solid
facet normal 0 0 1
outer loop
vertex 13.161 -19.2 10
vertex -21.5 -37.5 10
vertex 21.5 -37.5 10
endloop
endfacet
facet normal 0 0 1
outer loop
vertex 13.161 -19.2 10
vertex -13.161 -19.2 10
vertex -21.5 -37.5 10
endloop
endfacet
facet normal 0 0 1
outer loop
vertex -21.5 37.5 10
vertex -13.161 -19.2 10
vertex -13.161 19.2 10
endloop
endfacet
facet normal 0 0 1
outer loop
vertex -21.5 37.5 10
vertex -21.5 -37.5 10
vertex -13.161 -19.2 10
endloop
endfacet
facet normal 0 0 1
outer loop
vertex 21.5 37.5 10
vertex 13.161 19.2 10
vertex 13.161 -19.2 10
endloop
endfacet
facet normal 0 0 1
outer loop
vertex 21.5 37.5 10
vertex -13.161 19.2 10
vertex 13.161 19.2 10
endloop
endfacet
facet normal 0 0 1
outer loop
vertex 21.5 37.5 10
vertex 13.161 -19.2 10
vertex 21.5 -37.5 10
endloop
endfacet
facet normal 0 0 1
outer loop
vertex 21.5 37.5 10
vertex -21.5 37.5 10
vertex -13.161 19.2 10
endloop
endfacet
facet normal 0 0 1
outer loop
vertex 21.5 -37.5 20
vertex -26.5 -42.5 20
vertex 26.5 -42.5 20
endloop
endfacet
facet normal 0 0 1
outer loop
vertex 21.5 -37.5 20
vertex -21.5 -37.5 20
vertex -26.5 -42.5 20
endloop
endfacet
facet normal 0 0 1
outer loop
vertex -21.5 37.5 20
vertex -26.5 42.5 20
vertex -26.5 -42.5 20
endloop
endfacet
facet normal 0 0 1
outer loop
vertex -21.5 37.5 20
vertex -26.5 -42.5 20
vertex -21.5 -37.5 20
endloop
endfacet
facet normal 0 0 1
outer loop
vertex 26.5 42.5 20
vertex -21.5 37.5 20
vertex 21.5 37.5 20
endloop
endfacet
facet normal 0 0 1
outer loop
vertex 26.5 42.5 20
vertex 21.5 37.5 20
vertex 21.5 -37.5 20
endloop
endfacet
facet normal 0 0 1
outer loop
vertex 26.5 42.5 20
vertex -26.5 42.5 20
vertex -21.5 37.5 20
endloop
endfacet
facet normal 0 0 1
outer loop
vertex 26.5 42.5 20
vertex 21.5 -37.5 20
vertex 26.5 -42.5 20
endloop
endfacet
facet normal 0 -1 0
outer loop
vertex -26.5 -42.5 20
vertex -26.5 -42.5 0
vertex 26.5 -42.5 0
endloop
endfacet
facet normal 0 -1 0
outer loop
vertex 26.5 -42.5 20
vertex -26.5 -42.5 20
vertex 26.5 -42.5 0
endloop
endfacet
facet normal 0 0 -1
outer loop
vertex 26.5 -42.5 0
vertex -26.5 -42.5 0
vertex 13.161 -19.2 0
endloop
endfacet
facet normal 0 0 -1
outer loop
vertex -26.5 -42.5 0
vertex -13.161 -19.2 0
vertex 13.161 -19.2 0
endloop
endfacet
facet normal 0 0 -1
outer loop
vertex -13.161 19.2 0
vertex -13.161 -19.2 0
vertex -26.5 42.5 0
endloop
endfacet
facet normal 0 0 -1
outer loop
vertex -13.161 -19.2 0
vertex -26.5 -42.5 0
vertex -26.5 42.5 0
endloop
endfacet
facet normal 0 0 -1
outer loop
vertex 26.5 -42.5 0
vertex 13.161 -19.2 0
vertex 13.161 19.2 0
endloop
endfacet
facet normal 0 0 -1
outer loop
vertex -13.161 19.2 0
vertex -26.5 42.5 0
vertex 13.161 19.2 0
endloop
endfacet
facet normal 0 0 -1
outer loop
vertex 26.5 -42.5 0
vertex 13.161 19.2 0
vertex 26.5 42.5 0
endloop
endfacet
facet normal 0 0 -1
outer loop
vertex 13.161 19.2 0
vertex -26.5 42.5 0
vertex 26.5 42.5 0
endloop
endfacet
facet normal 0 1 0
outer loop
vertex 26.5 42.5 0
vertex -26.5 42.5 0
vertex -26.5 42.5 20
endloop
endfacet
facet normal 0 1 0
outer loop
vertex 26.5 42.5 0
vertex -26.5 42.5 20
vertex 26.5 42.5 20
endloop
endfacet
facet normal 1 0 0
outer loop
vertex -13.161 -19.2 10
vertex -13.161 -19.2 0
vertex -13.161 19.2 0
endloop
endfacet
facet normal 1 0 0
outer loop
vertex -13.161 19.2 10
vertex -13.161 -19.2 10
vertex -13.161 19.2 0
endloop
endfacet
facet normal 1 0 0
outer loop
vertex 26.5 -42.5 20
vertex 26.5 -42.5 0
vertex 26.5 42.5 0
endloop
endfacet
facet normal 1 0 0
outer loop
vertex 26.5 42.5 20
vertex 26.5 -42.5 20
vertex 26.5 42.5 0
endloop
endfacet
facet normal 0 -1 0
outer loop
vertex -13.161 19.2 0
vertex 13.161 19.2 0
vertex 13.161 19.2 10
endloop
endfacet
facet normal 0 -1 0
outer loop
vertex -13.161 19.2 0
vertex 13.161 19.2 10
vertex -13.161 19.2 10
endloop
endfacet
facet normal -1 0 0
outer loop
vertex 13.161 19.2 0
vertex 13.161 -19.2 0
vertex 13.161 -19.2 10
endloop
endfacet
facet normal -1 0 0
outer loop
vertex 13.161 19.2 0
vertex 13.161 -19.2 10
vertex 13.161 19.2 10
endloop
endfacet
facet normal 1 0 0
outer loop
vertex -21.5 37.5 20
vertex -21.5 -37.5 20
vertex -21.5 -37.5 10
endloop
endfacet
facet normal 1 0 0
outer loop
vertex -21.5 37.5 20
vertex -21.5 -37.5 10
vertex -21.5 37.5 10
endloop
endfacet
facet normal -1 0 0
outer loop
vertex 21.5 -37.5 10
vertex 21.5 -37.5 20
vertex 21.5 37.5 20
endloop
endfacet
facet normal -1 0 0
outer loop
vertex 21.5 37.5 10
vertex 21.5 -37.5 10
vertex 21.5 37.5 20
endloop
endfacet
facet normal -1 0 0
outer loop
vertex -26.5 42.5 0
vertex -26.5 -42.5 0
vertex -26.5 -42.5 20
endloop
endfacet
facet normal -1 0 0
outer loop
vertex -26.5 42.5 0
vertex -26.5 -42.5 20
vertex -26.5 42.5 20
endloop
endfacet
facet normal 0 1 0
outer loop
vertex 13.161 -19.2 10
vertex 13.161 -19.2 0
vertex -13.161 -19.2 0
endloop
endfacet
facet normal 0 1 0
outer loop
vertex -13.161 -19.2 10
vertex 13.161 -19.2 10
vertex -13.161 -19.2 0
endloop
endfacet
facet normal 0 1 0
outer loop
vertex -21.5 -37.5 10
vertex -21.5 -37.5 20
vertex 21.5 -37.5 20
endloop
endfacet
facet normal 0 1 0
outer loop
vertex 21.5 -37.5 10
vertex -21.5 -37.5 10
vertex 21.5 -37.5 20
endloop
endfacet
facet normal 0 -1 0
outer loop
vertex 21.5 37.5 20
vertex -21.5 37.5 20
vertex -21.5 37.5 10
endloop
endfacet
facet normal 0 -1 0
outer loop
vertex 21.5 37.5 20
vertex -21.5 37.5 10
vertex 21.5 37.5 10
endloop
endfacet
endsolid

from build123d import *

# Parameters (mm, degrees)
SKETCH3_W           = 53
SKETCH3_H           = 85
BOSS_EXTRUDE1_DEPTH = 20
SKETCH4_W           = 43
SKETCH4_H           = 75
CUT_EXTRUDE1_DEPTH  = 10
SKETCH5_W           = 26.321433762
SKETCH5_H           = 38.399655618
CUT_EXTRUDE2_DEPTH  = 10


with BuildPart() as part:
    # Sketch3 → Boss-Extrude1 (new body)
    with BuildSketch(Plane.XY):
        Rectangle(SKETCH3_W, SKETCH3_H)
    extrude(amount=BOSS_EXTRUDE1_DEPTH)

    # Sketch4 → Cut-Extrude1 (cut)
    with BuildSketch(Plane.XY.offset(20)):
        Rectangle(SKETCH4_W, SKETCH4_H)
    extrude(amount=-CUT_EXTRUDE1_DEPTH, mode=Mode.SUBTRACT)

    # Sketch5 → Cut-Extrude2 (cut)
    with BuildSketch(Plane(origin=(0, 0, 0), x_dir=(-1, 0, 0), z_dir=(0, 0, -1))):
        Rectangle(SKETCH5_W, SKETCH5_H)
    extrude(amount=-CUT_EXTRUDE2_DEPTH, mode=Mode.SUBTRACT)


solid = part.part
